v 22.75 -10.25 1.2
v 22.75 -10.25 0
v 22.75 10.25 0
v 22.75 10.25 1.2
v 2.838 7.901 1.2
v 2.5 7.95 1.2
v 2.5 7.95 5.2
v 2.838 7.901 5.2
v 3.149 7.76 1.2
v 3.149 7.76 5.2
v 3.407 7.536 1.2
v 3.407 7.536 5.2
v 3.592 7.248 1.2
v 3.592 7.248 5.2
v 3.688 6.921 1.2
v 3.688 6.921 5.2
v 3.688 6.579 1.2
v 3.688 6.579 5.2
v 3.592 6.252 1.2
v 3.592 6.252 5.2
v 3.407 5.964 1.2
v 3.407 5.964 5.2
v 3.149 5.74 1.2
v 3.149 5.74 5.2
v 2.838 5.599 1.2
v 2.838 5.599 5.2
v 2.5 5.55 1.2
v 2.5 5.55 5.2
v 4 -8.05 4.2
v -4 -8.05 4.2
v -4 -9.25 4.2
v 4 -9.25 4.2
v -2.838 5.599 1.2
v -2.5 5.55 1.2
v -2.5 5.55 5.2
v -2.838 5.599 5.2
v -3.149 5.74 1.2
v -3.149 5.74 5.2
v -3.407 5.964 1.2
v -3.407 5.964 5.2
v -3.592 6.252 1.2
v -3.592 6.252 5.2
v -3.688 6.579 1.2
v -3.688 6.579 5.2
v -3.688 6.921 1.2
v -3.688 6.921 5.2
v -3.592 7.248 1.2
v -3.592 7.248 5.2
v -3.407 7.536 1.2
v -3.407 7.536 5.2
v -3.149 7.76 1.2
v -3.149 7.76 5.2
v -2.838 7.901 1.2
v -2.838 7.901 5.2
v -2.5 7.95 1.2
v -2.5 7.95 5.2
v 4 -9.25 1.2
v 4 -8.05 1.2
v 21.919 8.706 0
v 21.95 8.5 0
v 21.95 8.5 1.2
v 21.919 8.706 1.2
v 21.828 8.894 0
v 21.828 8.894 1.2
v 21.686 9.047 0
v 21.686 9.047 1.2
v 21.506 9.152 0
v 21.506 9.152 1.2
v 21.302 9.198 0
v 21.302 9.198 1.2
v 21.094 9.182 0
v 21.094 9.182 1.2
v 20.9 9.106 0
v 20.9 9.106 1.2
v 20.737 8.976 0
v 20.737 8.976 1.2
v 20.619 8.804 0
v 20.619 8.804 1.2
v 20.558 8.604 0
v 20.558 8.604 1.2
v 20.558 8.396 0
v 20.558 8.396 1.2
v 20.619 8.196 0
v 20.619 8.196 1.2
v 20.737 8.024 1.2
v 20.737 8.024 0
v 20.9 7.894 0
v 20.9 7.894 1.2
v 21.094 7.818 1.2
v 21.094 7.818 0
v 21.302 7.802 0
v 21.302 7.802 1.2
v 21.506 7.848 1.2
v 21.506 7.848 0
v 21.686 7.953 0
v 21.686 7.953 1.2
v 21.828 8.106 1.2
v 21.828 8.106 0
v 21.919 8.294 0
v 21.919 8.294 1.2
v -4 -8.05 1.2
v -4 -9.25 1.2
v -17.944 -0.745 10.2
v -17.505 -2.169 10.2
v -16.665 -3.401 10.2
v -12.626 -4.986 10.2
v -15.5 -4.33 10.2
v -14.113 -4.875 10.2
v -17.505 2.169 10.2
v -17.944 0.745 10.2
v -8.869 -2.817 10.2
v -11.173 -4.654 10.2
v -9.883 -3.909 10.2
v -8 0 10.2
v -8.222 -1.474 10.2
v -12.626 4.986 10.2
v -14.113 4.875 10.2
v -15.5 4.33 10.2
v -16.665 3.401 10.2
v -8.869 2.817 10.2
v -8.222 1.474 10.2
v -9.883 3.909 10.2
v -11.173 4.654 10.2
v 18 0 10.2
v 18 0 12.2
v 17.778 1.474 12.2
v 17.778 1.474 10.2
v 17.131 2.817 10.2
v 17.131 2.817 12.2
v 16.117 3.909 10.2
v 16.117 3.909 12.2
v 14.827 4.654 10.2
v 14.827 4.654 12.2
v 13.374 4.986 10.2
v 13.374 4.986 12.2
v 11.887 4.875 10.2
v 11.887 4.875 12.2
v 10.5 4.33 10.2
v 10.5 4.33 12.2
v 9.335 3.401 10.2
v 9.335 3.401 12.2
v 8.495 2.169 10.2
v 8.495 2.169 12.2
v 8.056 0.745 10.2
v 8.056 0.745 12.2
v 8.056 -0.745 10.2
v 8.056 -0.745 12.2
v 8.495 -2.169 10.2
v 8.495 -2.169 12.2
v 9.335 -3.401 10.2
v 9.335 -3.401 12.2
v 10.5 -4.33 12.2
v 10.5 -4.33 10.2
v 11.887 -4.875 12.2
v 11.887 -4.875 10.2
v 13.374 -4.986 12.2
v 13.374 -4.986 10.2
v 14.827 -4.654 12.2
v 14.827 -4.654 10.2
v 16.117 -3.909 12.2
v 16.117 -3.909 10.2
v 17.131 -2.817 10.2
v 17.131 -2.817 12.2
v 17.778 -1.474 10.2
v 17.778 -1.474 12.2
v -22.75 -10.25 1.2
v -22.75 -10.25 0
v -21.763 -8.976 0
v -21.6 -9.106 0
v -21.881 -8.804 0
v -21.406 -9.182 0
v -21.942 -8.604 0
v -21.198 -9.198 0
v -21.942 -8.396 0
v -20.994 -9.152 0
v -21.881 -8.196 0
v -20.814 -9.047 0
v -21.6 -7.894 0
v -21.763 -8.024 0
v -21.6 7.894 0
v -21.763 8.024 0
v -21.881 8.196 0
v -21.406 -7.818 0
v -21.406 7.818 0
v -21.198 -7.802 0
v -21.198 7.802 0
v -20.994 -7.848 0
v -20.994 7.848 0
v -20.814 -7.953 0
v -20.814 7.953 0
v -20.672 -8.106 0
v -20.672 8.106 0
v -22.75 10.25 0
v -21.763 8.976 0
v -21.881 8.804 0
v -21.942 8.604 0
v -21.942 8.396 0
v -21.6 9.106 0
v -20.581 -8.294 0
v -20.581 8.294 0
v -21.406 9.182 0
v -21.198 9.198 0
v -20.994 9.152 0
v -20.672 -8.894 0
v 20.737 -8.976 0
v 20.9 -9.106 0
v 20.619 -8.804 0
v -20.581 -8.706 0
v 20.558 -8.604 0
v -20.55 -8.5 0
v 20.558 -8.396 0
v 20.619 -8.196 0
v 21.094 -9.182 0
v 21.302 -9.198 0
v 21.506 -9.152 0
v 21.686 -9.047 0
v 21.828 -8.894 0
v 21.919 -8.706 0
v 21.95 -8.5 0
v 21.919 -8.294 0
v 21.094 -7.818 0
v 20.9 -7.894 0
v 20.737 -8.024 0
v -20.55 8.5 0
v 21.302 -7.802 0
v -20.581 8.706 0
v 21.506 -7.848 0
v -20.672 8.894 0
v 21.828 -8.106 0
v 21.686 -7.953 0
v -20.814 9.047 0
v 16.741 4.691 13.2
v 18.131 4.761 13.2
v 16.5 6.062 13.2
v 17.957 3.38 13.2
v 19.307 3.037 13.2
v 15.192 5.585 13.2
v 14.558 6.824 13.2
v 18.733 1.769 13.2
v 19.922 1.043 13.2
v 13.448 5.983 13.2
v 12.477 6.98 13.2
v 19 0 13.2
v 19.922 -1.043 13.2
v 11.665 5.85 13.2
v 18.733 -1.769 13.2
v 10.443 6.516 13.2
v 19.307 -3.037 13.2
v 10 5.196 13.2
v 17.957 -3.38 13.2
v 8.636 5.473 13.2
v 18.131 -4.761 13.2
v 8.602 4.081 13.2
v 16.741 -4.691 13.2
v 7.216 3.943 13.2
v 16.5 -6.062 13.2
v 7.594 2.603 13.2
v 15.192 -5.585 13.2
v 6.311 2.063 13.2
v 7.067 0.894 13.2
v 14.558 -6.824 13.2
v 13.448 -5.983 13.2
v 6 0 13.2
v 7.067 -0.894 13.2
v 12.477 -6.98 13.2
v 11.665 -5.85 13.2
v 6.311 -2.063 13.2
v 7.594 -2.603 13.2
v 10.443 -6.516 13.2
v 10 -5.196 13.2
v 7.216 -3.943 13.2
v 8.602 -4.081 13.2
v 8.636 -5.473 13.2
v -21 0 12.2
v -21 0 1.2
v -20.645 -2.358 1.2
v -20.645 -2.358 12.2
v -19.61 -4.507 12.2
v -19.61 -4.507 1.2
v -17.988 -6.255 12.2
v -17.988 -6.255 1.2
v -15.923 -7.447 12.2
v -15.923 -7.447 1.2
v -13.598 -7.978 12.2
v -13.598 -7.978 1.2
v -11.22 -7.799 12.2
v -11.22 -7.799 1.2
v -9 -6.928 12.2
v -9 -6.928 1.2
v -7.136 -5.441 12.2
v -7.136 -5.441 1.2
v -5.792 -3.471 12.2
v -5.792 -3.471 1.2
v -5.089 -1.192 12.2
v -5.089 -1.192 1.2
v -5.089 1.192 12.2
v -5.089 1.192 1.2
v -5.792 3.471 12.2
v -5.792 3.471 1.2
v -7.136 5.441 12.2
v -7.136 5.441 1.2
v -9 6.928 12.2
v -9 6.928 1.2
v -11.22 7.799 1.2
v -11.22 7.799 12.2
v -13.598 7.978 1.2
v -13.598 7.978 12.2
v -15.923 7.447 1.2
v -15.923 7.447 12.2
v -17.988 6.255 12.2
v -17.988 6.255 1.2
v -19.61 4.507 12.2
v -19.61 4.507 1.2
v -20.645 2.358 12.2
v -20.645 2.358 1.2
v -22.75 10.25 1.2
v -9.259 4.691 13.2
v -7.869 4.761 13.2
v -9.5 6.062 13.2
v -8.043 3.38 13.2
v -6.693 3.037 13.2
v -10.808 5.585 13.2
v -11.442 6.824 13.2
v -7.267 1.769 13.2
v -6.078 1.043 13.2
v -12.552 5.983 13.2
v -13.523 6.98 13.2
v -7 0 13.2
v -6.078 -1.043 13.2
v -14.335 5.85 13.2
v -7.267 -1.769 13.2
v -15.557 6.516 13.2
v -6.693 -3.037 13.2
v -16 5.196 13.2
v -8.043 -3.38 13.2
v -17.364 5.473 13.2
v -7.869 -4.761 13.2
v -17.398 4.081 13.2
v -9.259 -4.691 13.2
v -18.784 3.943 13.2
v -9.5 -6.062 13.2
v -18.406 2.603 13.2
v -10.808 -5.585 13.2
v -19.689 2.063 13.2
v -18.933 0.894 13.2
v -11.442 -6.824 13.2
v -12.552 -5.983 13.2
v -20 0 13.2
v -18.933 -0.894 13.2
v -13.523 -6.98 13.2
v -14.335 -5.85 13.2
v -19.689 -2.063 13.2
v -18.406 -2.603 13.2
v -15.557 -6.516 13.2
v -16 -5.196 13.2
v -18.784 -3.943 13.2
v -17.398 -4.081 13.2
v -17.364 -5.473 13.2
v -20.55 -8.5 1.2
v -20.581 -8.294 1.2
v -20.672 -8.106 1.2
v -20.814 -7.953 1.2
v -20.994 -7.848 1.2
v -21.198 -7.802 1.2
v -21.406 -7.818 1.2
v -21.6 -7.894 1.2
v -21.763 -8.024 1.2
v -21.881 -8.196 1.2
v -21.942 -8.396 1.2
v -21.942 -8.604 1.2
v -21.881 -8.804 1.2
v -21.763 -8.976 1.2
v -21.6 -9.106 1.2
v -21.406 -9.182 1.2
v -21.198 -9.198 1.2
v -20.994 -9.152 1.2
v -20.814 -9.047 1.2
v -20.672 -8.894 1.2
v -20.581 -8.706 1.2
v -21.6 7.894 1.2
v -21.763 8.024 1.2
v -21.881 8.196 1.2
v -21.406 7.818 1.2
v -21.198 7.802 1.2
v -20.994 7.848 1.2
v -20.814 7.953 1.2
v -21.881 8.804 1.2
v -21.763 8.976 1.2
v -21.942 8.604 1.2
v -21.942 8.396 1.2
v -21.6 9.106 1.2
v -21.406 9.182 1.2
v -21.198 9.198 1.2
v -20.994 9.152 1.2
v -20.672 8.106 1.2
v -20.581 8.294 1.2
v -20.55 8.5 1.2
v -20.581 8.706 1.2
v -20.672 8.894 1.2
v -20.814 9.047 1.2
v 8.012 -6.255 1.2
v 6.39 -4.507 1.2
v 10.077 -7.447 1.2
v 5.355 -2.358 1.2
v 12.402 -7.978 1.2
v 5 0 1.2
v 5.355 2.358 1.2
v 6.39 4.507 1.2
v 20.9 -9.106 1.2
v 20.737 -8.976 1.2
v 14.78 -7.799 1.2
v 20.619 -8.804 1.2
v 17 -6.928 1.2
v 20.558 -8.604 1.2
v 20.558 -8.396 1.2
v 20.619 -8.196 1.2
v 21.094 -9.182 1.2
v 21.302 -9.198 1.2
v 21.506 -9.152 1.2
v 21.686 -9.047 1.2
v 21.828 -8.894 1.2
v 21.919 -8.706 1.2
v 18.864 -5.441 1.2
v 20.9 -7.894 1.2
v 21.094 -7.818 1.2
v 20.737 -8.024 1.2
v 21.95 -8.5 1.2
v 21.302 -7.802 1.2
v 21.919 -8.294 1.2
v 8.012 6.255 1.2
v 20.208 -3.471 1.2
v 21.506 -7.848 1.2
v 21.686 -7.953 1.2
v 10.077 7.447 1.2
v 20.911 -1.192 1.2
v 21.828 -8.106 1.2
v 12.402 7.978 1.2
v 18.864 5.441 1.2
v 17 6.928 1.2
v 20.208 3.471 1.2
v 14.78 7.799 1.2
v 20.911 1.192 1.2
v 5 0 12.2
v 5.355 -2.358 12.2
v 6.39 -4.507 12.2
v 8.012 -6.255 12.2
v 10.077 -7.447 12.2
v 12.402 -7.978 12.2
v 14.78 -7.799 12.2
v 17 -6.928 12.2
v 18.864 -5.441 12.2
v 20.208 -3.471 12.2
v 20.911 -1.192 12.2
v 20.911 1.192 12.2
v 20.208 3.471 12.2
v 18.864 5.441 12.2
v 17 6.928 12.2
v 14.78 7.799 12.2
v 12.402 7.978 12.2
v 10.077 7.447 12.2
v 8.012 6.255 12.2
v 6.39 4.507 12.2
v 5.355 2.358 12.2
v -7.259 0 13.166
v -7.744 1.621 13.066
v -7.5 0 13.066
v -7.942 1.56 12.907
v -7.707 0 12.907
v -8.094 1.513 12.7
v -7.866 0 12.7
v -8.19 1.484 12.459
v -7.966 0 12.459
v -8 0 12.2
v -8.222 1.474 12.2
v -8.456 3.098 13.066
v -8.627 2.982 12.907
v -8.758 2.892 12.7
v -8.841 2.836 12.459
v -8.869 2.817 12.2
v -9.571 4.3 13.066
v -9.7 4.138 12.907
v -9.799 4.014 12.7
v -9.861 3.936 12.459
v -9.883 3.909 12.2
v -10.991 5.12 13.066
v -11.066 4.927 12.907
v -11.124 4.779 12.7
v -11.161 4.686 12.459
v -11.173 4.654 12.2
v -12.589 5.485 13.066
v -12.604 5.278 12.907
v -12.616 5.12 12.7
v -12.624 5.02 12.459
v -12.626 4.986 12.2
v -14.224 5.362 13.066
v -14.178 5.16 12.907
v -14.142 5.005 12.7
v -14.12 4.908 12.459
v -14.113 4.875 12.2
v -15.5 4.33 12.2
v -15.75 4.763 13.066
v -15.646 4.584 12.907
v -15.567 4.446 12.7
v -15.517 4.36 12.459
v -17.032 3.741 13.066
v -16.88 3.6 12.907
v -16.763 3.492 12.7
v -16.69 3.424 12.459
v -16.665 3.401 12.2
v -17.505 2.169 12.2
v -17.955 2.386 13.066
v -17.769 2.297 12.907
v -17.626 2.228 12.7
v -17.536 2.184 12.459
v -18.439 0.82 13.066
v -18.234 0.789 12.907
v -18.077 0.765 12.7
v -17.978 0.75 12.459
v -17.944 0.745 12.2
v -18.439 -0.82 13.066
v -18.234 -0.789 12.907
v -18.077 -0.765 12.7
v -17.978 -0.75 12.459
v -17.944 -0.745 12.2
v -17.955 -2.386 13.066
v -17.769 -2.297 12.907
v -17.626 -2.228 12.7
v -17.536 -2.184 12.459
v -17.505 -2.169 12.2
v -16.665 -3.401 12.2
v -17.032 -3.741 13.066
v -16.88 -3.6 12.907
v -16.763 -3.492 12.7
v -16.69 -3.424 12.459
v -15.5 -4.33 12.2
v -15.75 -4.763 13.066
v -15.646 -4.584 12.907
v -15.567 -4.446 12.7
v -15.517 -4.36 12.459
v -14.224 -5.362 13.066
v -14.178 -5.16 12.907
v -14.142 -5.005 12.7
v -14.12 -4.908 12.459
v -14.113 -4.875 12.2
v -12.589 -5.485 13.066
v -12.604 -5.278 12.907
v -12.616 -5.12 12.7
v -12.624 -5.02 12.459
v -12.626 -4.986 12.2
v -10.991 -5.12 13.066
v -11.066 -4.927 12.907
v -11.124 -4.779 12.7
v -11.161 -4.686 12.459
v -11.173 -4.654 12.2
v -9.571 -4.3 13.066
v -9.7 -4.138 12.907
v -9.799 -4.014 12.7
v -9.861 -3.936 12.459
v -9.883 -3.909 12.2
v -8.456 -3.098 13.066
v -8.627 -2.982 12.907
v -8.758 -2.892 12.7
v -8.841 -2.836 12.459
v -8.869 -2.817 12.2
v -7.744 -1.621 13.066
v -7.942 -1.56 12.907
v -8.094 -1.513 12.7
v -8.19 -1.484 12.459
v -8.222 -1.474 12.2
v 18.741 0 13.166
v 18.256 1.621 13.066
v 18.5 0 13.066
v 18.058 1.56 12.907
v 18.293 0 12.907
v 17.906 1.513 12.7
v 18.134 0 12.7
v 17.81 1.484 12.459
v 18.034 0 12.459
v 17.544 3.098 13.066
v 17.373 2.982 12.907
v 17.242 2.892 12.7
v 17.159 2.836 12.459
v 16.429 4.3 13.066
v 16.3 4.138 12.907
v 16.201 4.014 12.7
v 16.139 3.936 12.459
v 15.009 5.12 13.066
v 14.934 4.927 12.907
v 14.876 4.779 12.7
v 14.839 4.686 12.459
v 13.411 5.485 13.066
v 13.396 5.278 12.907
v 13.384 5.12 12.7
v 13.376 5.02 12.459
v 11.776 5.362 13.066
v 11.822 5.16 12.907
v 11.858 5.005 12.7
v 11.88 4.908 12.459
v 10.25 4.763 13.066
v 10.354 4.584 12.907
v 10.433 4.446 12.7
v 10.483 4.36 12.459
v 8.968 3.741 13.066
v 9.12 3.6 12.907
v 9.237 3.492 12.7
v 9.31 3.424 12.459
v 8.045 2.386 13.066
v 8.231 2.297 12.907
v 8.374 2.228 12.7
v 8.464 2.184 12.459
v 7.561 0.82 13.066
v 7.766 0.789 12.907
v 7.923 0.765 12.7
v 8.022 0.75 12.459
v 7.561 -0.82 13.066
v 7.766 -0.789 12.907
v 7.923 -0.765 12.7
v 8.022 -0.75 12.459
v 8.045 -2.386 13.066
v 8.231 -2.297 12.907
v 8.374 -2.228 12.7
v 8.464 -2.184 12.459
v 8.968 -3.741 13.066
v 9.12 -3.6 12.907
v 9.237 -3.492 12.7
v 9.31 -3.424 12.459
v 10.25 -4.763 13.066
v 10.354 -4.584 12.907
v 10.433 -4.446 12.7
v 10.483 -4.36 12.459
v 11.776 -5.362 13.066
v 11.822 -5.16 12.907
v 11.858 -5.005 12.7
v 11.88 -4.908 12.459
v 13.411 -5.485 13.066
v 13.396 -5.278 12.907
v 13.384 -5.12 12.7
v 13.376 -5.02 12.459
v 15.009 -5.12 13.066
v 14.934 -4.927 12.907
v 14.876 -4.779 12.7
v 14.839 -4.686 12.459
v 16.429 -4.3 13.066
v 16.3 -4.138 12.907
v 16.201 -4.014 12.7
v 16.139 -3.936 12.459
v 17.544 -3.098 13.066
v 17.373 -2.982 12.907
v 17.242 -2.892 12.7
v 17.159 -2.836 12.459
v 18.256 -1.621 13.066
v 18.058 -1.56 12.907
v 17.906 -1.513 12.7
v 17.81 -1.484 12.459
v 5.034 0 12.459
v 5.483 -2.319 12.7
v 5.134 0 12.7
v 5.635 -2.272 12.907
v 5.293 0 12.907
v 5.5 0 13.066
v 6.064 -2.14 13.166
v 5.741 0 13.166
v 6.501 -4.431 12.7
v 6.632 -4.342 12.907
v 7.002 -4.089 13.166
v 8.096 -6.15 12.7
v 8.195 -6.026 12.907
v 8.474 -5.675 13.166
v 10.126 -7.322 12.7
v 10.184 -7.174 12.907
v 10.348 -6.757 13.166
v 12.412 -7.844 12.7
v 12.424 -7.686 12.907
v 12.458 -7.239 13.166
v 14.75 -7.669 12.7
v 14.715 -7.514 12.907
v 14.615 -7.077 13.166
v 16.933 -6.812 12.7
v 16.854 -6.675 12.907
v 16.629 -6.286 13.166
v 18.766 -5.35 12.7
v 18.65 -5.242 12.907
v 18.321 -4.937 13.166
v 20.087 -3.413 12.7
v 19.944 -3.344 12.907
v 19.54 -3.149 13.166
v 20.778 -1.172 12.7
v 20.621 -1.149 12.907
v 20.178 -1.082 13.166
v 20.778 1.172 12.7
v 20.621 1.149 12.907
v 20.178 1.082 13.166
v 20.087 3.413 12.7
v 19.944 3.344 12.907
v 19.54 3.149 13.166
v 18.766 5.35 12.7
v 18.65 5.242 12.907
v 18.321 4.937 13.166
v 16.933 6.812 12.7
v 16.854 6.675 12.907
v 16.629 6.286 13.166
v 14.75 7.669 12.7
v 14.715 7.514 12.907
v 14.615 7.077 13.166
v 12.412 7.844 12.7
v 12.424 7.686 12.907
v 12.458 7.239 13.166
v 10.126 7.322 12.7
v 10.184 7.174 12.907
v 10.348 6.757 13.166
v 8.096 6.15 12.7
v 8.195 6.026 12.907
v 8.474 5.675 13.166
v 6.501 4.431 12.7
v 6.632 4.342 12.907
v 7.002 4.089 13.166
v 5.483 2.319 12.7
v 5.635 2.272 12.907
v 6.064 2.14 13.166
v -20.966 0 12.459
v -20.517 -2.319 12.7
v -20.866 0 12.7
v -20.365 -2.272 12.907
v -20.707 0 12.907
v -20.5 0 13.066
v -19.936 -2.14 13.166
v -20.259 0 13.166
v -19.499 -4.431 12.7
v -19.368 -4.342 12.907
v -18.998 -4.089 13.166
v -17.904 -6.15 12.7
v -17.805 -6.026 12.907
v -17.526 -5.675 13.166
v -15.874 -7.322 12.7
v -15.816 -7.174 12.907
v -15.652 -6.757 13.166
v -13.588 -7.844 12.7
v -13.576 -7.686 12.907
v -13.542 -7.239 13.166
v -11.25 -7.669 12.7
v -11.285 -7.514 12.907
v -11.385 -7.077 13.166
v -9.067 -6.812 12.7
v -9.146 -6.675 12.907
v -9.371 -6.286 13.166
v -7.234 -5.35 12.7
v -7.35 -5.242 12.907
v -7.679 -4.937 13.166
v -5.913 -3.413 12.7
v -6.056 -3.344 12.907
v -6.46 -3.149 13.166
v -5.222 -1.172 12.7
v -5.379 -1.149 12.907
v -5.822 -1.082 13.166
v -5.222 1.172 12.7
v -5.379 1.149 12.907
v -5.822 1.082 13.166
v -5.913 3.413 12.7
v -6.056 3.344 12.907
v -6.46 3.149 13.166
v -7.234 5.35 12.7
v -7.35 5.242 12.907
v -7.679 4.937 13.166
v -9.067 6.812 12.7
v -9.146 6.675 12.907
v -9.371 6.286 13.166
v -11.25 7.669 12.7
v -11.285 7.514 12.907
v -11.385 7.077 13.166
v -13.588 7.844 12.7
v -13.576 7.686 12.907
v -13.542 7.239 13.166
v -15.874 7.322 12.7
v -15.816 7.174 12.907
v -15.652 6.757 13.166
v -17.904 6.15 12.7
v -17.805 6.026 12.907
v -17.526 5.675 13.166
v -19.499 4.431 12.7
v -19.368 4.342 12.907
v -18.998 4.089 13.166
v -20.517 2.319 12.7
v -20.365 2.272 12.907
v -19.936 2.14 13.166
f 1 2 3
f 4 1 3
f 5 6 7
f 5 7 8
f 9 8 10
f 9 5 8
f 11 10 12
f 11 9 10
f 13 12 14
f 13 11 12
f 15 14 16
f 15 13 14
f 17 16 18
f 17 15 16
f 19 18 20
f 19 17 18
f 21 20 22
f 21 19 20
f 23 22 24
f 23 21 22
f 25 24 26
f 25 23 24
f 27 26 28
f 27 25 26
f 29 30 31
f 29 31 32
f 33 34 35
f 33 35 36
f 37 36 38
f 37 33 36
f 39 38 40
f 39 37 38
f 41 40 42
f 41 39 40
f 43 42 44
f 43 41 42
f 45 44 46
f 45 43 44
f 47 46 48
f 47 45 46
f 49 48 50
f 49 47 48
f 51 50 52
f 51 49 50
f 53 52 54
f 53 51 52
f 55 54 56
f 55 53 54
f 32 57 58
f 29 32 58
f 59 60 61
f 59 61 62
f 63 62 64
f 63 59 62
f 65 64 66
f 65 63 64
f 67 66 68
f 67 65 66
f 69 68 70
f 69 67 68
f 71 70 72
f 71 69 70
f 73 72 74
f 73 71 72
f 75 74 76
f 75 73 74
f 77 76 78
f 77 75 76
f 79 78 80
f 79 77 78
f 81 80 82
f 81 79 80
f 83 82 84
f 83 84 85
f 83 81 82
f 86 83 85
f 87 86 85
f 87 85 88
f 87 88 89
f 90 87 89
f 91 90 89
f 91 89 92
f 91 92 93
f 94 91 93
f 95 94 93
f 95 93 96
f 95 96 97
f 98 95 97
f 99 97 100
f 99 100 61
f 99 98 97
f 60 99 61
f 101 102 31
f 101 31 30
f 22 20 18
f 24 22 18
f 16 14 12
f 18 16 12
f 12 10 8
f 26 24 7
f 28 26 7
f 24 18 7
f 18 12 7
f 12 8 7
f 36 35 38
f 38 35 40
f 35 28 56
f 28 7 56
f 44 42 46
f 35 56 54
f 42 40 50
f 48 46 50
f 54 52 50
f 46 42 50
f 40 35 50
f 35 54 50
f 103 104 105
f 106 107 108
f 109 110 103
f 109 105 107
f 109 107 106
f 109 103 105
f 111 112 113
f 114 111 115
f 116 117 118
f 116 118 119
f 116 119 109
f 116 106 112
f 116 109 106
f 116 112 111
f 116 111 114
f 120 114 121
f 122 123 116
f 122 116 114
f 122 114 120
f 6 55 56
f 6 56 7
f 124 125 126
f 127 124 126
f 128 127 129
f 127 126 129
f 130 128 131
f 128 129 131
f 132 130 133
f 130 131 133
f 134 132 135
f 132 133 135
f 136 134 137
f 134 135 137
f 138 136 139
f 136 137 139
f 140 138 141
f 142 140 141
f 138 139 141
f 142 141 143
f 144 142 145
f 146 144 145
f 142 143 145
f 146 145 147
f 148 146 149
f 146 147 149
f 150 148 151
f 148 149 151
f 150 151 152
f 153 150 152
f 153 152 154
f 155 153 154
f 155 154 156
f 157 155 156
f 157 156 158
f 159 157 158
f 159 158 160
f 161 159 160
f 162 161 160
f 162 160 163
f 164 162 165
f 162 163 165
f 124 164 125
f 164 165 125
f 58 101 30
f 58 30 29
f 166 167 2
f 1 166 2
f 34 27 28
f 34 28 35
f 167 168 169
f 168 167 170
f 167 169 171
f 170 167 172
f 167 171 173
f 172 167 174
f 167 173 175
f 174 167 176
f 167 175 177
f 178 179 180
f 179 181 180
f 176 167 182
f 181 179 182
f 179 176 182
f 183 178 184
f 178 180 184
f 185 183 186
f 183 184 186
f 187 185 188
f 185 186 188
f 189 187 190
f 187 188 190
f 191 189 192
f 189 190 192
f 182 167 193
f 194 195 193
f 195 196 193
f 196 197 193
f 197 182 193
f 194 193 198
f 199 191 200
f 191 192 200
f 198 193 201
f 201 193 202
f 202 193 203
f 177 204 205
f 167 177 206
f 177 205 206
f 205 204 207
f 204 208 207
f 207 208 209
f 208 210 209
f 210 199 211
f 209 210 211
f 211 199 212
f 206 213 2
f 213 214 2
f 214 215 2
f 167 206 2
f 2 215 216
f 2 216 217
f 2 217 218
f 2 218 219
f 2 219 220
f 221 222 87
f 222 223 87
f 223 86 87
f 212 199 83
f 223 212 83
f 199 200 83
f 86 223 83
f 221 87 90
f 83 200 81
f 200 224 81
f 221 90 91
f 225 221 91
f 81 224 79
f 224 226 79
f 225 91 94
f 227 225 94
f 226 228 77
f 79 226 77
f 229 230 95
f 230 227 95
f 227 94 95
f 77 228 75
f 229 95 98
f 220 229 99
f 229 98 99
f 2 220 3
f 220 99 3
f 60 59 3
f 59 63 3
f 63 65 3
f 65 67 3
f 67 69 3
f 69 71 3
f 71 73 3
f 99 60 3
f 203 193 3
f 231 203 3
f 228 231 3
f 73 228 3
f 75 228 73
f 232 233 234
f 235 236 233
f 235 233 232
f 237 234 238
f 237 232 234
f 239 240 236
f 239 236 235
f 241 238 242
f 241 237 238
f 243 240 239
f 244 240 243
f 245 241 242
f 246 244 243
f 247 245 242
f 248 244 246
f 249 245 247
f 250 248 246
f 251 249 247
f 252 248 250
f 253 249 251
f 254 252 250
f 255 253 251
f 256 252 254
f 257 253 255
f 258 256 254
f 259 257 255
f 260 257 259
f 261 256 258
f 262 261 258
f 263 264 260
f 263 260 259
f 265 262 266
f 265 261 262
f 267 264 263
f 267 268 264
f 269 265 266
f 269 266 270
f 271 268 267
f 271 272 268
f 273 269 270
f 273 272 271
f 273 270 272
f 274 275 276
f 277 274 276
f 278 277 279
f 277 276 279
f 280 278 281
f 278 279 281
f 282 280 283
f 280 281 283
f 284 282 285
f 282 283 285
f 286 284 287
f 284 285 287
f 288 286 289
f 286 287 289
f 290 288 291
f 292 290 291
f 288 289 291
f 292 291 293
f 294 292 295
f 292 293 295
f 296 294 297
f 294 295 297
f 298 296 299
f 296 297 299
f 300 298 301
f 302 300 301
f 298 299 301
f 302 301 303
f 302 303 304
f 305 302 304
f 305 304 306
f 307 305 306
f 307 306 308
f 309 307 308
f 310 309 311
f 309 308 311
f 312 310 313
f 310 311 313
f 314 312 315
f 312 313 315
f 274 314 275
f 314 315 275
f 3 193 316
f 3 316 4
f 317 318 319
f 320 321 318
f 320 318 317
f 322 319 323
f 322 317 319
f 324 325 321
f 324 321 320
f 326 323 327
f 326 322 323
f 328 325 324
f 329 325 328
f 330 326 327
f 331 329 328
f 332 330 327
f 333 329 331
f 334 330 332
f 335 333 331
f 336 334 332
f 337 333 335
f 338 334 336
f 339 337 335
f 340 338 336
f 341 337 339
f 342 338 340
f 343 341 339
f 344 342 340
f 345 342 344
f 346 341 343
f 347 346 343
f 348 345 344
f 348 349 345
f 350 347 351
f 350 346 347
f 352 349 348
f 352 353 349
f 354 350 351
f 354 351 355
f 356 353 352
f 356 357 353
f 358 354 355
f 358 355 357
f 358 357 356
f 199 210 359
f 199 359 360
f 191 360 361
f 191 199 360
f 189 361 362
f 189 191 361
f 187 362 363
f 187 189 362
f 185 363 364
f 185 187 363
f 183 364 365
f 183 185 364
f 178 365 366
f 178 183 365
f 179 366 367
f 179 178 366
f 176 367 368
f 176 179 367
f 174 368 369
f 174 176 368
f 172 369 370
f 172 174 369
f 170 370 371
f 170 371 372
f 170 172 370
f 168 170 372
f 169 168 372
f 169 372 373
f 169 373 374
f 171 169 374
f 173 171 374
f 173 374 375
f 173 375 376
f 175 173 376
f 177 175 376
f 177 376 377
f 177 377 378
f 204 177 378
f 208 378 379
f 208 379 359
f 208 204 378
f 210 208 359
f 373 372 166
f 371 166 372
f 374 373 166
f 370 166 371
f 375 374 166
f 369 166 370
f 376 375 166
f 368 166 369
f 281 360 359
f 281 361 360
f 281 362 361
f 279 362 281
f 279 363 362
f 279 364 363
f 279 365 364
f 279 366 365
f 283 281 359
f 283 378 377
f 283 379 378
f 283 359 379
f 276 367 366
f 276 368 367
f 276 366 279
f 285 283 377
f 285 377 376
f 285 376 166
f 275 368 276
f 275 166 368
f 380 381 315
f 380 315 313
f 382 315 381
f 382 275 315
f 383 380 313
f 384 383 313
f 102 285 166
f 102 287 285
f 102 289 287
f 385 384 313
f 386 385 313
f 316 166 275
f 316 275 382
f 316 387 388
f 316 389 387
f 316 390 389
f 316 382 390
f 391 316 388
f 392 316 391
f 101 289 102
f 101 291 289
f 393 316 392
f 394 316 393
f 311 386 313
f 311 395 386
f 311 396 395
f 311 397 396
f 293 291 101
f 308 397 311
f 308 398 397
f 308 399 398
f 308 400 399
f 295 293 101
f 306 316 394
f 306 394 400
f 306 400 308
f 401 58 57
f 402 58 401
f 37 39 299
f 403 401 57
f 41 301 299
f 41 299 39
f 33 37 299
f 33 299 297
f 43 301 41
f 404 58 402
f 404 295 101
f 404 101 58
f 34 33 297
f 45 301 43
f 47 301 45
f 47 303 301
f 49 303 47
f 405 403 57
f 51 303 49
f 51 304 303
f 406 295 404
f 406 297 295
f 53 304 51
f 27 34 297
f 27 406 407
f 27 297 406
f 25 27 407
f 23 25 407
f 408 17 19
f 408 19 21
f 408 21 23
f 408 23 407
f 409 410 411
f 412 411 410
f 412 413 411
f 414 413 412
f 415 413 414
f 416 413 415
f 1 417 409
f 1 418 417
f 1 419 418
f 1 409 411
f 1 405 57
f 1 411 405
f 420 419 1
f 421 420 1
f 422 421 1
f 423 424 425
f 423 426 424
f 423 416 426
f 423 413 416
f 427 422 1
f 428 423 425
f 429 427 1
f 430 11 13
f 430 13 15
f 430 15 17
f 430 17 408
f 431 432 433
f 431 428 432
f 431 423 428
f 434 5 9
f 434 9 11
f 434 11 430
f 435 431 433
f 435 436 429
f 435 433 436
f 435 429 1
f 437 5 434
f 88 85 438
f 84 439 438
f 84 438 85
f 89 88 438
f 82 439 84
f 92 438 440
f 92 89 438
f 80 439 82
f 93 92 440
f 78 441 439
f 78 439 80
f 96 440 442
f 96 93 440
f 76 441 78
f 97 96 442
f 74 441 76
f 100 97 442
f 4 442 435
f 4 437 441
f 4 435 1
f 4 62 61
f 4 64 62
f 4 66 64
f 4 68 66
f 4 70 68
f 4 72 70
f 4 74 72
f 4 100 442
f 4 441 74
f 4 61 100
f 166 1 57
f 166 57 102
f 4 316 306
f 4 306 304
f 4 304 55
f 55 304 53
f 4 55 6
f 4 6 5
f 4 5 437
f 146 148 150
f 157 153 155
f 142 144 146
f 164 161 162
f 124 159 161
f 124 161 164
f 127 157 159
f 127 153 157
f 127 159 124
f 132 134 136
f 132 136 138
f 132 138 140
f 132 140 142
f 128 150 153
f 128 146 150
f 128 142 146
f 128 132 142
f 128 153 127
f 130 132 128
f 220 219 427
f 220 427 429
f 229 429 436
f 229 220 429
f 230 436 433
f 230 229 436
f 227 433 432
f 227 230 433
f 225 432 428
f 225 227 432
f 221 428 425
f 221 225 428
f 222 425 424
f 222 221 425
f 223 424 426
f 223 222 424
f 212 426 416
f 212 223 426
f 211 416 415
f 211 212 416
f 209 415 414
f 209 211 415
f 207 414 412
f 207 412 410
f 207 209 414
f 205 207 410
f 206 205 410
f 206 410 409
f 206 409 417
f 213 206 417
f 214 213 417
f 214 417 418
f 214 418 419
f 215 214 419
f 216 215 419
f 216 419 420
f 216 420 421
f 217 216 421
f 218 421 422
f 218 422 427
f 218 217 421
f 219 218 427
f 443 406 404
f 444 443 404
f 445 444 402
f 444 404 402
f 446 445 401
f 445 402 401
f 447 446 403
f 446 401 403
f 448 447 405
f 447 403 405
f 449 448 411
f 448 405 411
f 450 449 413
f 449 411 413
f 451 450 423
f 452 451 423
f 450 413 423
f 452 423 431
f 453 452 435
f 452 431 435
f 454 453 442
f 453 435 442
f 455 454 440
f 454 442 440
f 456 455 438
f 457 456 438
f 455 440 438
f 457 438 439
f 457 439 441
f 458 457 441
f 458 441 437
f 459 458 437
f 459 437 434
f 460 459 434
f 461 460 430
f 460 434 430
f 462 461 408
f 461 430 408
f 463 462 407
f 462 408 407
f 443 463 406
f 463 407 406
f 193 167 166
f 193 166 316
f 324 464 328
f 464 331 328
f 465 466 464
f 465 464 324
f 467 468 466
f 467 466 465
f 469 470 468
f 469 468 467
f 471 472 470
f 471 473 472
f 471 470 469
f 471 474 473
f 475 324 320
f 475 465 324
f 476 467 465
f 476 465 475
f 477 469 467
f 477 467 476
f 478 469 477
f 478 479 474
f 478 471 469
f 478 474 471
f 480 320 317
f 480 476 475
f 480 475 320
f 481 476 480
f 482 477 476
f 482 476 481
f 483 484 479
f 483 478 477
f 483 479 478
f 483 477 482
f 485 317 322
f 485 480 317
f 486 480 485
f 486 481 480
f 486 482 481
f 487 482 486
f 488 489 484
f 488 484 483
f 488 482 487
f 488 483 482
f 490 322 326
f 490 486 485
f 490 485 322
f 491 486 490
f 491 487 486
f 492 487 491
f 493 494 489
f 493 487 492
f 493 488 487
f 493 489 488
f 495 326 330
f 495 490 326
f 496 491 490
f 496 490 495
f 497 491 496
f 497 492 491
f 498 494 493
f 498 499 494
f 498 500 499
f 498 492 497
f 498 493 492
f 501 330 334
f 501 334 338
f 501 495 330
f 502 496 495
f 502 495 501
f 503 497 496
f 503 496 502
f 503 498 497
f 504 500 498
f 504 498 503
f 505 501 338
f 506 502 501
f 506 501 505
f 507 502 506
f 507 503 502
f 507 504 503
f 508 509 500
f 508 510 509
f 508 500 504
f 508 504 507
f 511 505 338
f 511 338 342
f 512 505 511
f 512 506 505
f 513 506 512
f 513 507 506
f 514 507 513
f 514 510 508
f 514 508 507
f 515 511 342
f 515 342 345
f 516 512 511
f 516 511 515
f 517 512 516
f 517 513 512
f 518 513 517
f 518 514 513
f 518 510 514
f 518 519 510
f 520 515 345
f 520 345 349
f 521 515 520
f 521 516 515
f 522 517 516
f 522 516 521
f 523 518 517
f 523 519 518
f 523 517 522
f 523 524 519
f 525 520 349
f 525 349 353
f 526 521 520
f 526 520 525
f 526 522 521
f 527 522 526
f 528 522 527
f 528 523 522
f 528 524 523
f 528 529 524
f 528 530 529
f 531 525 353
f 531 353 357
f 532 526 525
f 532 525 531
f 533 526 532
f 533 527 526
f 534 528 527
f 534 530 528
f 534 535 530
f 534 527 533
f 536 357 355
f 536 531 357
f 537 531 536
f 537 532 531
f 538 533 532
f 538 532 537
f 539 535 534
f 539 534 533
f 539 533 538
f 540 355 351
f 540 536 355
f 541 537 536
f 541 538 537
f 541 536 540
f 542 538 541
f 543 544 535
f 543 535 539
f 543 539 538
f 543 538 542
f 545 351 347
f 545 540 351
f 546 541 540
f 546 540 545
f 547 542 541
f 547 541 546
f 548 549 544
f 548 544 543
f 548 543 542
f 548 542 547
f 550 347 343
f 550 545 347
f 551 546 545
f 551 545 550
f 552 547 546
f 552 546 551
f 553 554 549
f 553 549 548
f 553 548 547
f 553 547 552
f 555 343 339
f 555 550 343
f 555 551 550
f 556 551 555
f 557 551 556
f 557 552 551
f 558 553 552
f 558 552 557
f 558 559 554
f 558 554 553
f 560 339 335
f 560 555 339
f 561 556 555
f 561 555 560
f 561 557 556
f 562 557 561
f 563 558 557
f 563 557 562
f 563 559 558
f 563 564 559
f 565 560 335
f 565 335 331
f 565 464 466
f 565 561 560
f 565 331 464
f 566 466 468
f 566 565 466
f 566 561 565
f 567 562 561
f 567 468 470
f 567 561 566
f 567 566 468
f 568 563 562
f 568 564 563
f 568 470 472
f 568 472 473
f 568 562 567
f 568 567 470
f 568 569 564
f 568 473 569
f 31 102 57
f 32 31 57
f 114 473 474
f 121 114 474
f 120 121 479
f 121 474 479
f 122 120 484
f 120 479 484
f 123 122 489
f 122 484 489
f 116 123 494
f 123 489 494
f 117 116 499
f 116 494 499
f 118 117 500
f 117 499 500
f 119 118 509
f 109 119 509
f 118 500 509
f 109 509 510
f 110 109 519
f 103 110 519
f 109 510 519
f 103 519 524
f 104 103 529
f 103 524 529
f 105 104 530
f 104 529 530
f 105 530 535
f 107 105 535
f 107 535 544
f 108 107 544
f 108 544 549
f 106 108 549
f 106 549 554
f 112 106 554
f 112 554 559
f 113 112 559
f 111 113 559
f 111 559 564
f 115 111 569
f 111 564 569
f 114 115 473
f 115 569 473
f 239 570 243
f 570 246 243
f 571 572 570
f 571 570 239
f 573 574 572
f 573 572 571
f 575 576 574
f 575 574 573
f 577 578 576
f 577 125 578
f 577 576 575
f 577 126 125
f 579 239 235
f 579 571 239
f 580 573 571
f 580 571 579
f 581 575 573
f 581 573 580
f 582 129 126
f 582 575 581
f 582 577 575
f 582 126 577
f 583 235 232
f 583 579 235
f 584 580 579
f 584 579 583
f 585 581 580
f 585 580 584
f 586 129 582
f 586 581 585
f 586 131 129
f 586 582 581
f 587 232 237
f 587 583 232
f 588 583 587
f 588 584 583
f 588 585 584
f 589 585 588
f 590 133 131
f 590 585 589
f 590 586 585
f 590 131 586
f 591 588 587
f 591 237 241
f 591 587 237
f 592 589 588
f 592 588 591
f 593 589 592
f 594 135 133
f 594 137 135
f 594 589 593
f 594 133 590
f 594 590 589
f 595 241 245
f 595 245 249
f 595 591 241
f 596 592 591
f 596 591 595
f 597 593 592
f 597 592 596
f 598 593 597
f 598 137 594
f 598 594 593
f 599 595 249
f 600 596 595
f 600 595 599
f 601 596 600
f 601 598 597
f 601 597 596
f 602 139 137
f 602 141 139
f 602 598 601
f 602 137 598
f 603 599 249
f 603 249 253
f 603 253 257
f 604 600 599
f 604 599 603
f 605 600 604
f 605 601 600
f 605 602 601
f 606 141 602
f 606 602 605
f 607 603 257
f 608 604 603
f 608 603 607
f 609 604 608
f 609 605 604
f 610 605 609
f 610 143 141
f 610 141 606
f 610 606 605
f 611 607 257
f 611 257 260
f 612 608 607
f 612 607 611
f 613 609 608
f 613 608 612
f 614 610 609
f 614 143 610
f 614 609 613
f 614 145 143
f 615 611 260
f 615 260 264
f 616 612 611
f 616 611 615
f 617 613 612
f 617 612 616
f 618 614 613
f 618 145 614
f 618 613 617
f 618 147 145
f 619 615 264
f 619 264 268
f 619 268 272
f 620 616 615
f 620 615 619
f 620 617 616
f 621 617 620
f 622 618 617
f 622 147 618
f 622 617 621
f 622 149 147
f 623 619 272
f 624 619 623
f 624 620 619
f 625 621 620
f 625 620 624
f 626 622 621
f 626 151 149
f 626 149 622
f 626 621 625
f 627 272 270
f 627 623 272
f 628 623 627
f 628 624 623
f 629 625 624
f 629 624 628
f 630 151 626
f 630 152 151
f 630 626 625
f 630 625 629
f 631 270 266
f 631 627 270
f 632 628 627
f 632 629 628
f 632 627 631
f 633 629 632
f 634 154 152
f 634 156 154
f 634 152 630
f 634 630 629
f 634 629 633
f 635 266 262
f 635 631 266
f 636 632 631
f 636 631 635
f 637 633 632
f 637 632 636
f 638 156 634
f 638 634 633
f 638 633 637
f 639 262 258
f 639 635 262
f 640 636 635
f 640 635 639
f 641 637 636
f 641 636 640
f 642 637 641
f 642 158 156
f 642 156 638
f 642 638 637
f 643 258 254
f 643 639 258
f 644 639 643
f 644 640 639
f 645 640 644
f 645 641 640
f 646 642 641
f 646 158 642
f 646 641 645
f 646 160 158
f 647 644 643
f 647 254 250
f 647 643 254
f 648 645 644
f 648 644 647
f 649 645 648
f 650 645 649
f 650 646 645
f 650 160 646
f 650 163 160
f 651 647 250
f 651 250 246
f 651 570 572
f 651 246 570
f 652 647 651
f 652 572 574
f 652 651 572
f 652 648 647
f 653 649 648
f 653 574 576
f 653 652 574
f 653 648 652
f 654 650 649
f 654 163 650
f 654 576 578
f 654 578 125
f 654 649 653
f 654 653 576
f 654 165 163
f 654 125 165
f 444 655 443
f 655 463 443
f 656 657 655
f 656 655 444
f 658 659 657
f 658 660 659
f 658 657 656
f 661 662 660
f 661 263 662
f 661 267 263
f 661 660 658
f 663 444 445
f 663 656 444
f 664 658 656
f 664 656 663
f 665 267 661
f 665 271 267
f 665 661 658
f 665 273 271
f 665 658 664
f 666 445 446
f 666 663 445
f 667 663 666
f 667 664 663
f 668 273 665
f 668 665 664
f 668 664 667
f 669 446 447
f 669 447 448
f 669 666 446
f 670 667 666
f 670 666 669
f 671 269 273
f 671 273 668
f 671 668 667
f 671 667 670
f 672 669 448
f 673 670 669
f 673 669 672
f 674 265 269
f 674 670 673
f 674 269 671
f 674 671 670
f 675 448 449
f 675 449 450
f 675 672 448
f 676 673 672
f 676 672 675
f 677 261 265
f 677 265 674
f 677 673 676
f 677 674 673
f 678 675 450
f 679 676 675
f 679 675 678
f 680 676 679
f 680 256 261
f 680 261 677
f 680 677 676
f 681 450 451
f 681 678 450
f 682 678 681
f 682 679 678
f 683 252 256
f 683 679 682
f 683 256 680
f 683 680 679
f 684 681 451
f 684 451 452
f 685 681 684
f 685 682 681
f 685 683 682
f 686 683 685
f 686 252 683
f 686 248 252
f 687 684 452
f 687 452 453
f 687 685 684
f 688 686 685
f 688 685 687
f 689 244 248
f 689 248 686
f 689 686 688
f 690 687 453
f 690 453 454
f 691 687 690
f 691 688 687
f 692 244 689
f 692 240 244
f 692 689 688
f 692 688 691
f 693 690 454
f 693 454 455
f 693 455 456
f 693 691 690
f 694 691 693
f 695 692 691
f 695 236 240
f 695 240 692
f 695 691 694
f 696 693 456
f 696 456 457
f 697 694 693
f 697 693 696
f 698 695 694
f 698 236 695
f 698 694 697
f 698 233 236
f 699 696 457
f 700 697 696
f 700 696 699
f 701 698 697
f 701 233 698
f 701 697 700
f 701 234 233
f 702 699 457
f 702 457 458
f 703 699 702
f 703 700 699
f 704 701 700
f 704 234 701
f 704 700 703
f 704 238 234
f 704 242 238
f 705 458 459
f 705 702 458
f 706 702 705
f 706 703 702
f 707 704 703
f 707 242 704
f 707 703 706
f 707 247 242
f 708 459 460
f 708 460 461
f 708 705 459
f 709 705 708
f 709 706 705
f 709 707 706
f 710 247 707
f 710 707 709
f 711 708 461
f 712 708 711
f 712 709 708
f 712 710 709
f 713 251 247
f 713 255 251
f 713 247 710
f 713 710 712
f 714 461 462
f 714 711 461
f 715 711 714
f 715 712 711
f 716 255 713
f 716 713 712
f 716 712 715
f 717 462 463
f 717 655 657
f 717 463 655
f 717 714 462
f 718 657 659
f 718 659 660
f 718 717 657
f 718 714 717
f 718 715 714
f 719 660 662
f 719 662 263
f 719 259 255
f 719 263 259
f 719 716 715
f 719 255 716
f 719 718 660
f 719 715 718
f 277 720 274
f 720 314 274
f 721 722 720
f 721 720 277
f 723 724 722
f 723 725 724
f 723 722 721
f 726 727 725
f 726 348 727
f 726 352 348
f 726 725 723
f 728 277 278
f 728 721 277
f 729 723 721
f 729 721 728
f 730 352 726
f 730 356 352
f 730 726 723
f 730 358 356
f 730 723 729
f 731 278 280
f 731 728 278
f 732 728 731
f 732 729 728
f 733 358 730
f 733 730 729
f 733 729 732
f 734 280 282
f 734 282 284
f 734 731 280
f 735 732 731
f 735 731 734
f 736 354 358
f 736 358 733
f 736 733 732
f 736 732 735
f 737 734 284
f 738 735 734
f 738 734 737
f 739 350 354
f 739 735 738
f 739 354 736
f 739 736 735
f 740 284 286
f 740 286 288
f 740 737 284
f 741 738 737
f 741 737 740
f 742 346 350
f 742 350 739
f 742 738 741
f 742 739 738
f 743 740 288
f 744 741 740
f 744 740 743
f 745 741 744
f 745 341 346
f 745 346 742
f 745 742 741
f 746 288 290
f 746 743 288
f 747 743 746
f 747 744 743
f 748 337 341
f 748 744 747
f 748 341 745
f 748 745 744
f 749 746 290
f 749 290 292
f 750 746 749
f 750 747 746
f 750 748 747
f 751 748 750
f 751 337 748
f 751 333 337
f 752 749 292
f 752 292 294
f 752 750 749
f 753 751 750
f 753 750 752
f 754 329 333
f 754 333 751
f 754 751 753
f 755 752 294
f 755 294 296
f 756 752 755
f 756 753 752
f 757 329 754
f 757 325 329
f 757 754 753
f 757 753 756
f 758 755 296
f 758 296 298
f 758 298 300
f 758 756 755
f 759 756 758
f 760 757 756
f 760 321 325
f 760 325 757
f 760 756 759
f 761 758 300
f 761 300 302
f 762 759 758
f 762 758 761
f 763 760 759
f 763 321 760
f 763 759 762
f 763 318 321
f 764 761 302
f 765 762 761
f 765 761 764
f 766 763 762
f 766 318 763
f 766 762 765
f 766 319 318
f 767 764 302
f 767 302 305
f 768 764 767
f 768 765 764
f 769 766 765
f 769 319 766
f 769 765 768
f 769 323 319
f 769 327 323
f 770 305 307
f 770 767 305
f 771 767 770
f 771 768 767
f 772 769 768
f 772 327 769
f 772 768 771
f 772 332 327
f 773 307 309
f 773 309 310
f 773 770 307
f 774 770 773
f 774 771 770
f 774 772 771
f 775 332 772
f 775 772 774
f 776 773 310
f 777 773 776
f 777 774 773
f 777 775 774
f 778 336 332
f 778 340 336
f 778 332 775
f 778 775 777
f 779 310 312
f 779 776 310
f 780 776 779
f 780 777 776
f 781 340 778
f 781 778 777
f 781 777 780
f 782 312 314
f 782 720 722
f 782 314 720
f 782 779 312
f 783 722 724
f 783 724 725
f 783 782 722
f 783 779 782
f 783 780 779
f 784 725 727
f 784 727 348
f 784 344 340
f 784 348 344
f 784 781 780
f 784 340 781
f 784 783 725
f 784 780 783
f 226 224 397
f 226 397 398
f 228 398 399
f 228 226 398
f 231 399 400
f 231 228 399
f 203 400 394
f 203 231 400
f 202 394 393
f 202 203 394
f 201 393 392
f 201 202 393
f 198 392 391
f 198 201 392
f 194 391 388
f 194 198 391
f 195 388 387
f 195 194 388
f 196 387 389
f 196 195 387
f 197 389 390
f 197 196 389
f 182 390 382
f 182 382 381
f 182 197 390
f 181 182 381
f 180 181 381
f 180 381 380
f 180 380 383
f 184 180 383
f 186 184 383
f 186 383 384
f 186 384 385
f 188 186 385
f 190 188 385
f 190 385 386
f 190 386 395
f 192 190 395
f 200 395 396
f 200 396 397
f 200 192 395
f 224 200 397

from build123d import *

# Parameters (mm, degrees)
SKETCH_1_W          = 45.5
SKETCH_1_H          = 20.5
SKETCH_1_R          = 0.7
EXTRUDE_1_DEPTH     = 1.2
SKETCH_2_R          = 8
EXTRUDE_2_DEPTH     = 12
SKETCH_3_R          = 5
CUT_EXTRUDE_1_DEPTH = 3
FILLET_1_R          = 1
EXTRUDE_3_DEPTH     = 4
SKETCH_5_W          = 8
SKETCH_5_H          = 1.2
EXTRUDE_4_DEPTH     = 3


with BuildPart() as part:
    # 草图1 → 凸台-拉伸1 (new body)
    with BuildSketch(Plane.XY):
        Rectangle(SKETCH_1_W, SKETCH_1_H)
        with Locations((21.25, 8.5)):
            Circle(SKETCH_1_R, mode=Mode.SUBTRACT)
        with Locations((-21.25, 8.5)):
            Circle(SKETCH_1_R, mode=Mode.SUBTRACT)
        with Locations((-21.25, -8.5)):
            Circle(SKETCH_1_R, mode=Mode.SUBTRACT)
        with Locations((21.25, -8.5)):
            Circle(SKETCH_1_R, mode=Mode.SUBTRACT)
    extrude(amount=EXTRUDE_1_DEPTH)

    # 草图2 → 凸台-拉伸2 (add)
    with BuildSketch(Plane.XY.offset(1.2)):
        with Locations(Location((-13, 0, 0), (0, 0, 180))):
            Circle(SKETCH_2_R)
        with Locations(Location((13, 0, 0), (0, 0, 180))):
            Circle(SKETCH_2_R)
    extrude(amount=EXTRUDE_2_DEPTH)

    # 草图3 → 切除-拉伸1 (cut)
    with BuildSketch(Plane.XY.offset(13.2)):
        with Locations((-13, 0)):
            Circle(SKETCH_3_R)
        with Locations((13, 0)):
            Circle(SKETCH_3_R)
    extrude(amount=-CUT_EXTRUDE_1_DEPTH, mode=Mode.SUBTRACT)

    # 圆角1
    fillet_1_edges = [part.edges().sort_by_distance(p)[0] for p in [
        (-5, 0, 13.2),
        (21, 0, 13.2),
        (-18, 0, 13.2),
        (8, 0, 13.2),
    ]]
    fillet(fillet_1_edges, radius=FILLET_1_R)

    # 草图4 → 凸台-拉伸3 (add)
    with BuildSketch(Plane.XY.offset(1.2)):
        with BuildLine():
            Line((-2.5, 7.95), (2.5, 7.95))
            ThreePointArc((2.5, 7.95), (3.7, 6.75), (2.5, 5.55))
            Line((2.5, 5.55), (-2.5, 5.55))
            ThreePointArc((-2.5, 5.55), (-3.7, 6.75), (-2.5, 7.95))
        make_face()
    extrude(amount=EXTRUDE_3_DEPTH)

    # 草图5 → 凸台-拉伸4 (add)
    with BuildSketch(Plane.XY.offset(1.2)):
        with Locations((0, -8.65)):
            Rectangle(SKETCH_5_W, SKETCH_5_H)
    extrude(amount=EXTRUDE_4_DEPTH)


solid = part.part
